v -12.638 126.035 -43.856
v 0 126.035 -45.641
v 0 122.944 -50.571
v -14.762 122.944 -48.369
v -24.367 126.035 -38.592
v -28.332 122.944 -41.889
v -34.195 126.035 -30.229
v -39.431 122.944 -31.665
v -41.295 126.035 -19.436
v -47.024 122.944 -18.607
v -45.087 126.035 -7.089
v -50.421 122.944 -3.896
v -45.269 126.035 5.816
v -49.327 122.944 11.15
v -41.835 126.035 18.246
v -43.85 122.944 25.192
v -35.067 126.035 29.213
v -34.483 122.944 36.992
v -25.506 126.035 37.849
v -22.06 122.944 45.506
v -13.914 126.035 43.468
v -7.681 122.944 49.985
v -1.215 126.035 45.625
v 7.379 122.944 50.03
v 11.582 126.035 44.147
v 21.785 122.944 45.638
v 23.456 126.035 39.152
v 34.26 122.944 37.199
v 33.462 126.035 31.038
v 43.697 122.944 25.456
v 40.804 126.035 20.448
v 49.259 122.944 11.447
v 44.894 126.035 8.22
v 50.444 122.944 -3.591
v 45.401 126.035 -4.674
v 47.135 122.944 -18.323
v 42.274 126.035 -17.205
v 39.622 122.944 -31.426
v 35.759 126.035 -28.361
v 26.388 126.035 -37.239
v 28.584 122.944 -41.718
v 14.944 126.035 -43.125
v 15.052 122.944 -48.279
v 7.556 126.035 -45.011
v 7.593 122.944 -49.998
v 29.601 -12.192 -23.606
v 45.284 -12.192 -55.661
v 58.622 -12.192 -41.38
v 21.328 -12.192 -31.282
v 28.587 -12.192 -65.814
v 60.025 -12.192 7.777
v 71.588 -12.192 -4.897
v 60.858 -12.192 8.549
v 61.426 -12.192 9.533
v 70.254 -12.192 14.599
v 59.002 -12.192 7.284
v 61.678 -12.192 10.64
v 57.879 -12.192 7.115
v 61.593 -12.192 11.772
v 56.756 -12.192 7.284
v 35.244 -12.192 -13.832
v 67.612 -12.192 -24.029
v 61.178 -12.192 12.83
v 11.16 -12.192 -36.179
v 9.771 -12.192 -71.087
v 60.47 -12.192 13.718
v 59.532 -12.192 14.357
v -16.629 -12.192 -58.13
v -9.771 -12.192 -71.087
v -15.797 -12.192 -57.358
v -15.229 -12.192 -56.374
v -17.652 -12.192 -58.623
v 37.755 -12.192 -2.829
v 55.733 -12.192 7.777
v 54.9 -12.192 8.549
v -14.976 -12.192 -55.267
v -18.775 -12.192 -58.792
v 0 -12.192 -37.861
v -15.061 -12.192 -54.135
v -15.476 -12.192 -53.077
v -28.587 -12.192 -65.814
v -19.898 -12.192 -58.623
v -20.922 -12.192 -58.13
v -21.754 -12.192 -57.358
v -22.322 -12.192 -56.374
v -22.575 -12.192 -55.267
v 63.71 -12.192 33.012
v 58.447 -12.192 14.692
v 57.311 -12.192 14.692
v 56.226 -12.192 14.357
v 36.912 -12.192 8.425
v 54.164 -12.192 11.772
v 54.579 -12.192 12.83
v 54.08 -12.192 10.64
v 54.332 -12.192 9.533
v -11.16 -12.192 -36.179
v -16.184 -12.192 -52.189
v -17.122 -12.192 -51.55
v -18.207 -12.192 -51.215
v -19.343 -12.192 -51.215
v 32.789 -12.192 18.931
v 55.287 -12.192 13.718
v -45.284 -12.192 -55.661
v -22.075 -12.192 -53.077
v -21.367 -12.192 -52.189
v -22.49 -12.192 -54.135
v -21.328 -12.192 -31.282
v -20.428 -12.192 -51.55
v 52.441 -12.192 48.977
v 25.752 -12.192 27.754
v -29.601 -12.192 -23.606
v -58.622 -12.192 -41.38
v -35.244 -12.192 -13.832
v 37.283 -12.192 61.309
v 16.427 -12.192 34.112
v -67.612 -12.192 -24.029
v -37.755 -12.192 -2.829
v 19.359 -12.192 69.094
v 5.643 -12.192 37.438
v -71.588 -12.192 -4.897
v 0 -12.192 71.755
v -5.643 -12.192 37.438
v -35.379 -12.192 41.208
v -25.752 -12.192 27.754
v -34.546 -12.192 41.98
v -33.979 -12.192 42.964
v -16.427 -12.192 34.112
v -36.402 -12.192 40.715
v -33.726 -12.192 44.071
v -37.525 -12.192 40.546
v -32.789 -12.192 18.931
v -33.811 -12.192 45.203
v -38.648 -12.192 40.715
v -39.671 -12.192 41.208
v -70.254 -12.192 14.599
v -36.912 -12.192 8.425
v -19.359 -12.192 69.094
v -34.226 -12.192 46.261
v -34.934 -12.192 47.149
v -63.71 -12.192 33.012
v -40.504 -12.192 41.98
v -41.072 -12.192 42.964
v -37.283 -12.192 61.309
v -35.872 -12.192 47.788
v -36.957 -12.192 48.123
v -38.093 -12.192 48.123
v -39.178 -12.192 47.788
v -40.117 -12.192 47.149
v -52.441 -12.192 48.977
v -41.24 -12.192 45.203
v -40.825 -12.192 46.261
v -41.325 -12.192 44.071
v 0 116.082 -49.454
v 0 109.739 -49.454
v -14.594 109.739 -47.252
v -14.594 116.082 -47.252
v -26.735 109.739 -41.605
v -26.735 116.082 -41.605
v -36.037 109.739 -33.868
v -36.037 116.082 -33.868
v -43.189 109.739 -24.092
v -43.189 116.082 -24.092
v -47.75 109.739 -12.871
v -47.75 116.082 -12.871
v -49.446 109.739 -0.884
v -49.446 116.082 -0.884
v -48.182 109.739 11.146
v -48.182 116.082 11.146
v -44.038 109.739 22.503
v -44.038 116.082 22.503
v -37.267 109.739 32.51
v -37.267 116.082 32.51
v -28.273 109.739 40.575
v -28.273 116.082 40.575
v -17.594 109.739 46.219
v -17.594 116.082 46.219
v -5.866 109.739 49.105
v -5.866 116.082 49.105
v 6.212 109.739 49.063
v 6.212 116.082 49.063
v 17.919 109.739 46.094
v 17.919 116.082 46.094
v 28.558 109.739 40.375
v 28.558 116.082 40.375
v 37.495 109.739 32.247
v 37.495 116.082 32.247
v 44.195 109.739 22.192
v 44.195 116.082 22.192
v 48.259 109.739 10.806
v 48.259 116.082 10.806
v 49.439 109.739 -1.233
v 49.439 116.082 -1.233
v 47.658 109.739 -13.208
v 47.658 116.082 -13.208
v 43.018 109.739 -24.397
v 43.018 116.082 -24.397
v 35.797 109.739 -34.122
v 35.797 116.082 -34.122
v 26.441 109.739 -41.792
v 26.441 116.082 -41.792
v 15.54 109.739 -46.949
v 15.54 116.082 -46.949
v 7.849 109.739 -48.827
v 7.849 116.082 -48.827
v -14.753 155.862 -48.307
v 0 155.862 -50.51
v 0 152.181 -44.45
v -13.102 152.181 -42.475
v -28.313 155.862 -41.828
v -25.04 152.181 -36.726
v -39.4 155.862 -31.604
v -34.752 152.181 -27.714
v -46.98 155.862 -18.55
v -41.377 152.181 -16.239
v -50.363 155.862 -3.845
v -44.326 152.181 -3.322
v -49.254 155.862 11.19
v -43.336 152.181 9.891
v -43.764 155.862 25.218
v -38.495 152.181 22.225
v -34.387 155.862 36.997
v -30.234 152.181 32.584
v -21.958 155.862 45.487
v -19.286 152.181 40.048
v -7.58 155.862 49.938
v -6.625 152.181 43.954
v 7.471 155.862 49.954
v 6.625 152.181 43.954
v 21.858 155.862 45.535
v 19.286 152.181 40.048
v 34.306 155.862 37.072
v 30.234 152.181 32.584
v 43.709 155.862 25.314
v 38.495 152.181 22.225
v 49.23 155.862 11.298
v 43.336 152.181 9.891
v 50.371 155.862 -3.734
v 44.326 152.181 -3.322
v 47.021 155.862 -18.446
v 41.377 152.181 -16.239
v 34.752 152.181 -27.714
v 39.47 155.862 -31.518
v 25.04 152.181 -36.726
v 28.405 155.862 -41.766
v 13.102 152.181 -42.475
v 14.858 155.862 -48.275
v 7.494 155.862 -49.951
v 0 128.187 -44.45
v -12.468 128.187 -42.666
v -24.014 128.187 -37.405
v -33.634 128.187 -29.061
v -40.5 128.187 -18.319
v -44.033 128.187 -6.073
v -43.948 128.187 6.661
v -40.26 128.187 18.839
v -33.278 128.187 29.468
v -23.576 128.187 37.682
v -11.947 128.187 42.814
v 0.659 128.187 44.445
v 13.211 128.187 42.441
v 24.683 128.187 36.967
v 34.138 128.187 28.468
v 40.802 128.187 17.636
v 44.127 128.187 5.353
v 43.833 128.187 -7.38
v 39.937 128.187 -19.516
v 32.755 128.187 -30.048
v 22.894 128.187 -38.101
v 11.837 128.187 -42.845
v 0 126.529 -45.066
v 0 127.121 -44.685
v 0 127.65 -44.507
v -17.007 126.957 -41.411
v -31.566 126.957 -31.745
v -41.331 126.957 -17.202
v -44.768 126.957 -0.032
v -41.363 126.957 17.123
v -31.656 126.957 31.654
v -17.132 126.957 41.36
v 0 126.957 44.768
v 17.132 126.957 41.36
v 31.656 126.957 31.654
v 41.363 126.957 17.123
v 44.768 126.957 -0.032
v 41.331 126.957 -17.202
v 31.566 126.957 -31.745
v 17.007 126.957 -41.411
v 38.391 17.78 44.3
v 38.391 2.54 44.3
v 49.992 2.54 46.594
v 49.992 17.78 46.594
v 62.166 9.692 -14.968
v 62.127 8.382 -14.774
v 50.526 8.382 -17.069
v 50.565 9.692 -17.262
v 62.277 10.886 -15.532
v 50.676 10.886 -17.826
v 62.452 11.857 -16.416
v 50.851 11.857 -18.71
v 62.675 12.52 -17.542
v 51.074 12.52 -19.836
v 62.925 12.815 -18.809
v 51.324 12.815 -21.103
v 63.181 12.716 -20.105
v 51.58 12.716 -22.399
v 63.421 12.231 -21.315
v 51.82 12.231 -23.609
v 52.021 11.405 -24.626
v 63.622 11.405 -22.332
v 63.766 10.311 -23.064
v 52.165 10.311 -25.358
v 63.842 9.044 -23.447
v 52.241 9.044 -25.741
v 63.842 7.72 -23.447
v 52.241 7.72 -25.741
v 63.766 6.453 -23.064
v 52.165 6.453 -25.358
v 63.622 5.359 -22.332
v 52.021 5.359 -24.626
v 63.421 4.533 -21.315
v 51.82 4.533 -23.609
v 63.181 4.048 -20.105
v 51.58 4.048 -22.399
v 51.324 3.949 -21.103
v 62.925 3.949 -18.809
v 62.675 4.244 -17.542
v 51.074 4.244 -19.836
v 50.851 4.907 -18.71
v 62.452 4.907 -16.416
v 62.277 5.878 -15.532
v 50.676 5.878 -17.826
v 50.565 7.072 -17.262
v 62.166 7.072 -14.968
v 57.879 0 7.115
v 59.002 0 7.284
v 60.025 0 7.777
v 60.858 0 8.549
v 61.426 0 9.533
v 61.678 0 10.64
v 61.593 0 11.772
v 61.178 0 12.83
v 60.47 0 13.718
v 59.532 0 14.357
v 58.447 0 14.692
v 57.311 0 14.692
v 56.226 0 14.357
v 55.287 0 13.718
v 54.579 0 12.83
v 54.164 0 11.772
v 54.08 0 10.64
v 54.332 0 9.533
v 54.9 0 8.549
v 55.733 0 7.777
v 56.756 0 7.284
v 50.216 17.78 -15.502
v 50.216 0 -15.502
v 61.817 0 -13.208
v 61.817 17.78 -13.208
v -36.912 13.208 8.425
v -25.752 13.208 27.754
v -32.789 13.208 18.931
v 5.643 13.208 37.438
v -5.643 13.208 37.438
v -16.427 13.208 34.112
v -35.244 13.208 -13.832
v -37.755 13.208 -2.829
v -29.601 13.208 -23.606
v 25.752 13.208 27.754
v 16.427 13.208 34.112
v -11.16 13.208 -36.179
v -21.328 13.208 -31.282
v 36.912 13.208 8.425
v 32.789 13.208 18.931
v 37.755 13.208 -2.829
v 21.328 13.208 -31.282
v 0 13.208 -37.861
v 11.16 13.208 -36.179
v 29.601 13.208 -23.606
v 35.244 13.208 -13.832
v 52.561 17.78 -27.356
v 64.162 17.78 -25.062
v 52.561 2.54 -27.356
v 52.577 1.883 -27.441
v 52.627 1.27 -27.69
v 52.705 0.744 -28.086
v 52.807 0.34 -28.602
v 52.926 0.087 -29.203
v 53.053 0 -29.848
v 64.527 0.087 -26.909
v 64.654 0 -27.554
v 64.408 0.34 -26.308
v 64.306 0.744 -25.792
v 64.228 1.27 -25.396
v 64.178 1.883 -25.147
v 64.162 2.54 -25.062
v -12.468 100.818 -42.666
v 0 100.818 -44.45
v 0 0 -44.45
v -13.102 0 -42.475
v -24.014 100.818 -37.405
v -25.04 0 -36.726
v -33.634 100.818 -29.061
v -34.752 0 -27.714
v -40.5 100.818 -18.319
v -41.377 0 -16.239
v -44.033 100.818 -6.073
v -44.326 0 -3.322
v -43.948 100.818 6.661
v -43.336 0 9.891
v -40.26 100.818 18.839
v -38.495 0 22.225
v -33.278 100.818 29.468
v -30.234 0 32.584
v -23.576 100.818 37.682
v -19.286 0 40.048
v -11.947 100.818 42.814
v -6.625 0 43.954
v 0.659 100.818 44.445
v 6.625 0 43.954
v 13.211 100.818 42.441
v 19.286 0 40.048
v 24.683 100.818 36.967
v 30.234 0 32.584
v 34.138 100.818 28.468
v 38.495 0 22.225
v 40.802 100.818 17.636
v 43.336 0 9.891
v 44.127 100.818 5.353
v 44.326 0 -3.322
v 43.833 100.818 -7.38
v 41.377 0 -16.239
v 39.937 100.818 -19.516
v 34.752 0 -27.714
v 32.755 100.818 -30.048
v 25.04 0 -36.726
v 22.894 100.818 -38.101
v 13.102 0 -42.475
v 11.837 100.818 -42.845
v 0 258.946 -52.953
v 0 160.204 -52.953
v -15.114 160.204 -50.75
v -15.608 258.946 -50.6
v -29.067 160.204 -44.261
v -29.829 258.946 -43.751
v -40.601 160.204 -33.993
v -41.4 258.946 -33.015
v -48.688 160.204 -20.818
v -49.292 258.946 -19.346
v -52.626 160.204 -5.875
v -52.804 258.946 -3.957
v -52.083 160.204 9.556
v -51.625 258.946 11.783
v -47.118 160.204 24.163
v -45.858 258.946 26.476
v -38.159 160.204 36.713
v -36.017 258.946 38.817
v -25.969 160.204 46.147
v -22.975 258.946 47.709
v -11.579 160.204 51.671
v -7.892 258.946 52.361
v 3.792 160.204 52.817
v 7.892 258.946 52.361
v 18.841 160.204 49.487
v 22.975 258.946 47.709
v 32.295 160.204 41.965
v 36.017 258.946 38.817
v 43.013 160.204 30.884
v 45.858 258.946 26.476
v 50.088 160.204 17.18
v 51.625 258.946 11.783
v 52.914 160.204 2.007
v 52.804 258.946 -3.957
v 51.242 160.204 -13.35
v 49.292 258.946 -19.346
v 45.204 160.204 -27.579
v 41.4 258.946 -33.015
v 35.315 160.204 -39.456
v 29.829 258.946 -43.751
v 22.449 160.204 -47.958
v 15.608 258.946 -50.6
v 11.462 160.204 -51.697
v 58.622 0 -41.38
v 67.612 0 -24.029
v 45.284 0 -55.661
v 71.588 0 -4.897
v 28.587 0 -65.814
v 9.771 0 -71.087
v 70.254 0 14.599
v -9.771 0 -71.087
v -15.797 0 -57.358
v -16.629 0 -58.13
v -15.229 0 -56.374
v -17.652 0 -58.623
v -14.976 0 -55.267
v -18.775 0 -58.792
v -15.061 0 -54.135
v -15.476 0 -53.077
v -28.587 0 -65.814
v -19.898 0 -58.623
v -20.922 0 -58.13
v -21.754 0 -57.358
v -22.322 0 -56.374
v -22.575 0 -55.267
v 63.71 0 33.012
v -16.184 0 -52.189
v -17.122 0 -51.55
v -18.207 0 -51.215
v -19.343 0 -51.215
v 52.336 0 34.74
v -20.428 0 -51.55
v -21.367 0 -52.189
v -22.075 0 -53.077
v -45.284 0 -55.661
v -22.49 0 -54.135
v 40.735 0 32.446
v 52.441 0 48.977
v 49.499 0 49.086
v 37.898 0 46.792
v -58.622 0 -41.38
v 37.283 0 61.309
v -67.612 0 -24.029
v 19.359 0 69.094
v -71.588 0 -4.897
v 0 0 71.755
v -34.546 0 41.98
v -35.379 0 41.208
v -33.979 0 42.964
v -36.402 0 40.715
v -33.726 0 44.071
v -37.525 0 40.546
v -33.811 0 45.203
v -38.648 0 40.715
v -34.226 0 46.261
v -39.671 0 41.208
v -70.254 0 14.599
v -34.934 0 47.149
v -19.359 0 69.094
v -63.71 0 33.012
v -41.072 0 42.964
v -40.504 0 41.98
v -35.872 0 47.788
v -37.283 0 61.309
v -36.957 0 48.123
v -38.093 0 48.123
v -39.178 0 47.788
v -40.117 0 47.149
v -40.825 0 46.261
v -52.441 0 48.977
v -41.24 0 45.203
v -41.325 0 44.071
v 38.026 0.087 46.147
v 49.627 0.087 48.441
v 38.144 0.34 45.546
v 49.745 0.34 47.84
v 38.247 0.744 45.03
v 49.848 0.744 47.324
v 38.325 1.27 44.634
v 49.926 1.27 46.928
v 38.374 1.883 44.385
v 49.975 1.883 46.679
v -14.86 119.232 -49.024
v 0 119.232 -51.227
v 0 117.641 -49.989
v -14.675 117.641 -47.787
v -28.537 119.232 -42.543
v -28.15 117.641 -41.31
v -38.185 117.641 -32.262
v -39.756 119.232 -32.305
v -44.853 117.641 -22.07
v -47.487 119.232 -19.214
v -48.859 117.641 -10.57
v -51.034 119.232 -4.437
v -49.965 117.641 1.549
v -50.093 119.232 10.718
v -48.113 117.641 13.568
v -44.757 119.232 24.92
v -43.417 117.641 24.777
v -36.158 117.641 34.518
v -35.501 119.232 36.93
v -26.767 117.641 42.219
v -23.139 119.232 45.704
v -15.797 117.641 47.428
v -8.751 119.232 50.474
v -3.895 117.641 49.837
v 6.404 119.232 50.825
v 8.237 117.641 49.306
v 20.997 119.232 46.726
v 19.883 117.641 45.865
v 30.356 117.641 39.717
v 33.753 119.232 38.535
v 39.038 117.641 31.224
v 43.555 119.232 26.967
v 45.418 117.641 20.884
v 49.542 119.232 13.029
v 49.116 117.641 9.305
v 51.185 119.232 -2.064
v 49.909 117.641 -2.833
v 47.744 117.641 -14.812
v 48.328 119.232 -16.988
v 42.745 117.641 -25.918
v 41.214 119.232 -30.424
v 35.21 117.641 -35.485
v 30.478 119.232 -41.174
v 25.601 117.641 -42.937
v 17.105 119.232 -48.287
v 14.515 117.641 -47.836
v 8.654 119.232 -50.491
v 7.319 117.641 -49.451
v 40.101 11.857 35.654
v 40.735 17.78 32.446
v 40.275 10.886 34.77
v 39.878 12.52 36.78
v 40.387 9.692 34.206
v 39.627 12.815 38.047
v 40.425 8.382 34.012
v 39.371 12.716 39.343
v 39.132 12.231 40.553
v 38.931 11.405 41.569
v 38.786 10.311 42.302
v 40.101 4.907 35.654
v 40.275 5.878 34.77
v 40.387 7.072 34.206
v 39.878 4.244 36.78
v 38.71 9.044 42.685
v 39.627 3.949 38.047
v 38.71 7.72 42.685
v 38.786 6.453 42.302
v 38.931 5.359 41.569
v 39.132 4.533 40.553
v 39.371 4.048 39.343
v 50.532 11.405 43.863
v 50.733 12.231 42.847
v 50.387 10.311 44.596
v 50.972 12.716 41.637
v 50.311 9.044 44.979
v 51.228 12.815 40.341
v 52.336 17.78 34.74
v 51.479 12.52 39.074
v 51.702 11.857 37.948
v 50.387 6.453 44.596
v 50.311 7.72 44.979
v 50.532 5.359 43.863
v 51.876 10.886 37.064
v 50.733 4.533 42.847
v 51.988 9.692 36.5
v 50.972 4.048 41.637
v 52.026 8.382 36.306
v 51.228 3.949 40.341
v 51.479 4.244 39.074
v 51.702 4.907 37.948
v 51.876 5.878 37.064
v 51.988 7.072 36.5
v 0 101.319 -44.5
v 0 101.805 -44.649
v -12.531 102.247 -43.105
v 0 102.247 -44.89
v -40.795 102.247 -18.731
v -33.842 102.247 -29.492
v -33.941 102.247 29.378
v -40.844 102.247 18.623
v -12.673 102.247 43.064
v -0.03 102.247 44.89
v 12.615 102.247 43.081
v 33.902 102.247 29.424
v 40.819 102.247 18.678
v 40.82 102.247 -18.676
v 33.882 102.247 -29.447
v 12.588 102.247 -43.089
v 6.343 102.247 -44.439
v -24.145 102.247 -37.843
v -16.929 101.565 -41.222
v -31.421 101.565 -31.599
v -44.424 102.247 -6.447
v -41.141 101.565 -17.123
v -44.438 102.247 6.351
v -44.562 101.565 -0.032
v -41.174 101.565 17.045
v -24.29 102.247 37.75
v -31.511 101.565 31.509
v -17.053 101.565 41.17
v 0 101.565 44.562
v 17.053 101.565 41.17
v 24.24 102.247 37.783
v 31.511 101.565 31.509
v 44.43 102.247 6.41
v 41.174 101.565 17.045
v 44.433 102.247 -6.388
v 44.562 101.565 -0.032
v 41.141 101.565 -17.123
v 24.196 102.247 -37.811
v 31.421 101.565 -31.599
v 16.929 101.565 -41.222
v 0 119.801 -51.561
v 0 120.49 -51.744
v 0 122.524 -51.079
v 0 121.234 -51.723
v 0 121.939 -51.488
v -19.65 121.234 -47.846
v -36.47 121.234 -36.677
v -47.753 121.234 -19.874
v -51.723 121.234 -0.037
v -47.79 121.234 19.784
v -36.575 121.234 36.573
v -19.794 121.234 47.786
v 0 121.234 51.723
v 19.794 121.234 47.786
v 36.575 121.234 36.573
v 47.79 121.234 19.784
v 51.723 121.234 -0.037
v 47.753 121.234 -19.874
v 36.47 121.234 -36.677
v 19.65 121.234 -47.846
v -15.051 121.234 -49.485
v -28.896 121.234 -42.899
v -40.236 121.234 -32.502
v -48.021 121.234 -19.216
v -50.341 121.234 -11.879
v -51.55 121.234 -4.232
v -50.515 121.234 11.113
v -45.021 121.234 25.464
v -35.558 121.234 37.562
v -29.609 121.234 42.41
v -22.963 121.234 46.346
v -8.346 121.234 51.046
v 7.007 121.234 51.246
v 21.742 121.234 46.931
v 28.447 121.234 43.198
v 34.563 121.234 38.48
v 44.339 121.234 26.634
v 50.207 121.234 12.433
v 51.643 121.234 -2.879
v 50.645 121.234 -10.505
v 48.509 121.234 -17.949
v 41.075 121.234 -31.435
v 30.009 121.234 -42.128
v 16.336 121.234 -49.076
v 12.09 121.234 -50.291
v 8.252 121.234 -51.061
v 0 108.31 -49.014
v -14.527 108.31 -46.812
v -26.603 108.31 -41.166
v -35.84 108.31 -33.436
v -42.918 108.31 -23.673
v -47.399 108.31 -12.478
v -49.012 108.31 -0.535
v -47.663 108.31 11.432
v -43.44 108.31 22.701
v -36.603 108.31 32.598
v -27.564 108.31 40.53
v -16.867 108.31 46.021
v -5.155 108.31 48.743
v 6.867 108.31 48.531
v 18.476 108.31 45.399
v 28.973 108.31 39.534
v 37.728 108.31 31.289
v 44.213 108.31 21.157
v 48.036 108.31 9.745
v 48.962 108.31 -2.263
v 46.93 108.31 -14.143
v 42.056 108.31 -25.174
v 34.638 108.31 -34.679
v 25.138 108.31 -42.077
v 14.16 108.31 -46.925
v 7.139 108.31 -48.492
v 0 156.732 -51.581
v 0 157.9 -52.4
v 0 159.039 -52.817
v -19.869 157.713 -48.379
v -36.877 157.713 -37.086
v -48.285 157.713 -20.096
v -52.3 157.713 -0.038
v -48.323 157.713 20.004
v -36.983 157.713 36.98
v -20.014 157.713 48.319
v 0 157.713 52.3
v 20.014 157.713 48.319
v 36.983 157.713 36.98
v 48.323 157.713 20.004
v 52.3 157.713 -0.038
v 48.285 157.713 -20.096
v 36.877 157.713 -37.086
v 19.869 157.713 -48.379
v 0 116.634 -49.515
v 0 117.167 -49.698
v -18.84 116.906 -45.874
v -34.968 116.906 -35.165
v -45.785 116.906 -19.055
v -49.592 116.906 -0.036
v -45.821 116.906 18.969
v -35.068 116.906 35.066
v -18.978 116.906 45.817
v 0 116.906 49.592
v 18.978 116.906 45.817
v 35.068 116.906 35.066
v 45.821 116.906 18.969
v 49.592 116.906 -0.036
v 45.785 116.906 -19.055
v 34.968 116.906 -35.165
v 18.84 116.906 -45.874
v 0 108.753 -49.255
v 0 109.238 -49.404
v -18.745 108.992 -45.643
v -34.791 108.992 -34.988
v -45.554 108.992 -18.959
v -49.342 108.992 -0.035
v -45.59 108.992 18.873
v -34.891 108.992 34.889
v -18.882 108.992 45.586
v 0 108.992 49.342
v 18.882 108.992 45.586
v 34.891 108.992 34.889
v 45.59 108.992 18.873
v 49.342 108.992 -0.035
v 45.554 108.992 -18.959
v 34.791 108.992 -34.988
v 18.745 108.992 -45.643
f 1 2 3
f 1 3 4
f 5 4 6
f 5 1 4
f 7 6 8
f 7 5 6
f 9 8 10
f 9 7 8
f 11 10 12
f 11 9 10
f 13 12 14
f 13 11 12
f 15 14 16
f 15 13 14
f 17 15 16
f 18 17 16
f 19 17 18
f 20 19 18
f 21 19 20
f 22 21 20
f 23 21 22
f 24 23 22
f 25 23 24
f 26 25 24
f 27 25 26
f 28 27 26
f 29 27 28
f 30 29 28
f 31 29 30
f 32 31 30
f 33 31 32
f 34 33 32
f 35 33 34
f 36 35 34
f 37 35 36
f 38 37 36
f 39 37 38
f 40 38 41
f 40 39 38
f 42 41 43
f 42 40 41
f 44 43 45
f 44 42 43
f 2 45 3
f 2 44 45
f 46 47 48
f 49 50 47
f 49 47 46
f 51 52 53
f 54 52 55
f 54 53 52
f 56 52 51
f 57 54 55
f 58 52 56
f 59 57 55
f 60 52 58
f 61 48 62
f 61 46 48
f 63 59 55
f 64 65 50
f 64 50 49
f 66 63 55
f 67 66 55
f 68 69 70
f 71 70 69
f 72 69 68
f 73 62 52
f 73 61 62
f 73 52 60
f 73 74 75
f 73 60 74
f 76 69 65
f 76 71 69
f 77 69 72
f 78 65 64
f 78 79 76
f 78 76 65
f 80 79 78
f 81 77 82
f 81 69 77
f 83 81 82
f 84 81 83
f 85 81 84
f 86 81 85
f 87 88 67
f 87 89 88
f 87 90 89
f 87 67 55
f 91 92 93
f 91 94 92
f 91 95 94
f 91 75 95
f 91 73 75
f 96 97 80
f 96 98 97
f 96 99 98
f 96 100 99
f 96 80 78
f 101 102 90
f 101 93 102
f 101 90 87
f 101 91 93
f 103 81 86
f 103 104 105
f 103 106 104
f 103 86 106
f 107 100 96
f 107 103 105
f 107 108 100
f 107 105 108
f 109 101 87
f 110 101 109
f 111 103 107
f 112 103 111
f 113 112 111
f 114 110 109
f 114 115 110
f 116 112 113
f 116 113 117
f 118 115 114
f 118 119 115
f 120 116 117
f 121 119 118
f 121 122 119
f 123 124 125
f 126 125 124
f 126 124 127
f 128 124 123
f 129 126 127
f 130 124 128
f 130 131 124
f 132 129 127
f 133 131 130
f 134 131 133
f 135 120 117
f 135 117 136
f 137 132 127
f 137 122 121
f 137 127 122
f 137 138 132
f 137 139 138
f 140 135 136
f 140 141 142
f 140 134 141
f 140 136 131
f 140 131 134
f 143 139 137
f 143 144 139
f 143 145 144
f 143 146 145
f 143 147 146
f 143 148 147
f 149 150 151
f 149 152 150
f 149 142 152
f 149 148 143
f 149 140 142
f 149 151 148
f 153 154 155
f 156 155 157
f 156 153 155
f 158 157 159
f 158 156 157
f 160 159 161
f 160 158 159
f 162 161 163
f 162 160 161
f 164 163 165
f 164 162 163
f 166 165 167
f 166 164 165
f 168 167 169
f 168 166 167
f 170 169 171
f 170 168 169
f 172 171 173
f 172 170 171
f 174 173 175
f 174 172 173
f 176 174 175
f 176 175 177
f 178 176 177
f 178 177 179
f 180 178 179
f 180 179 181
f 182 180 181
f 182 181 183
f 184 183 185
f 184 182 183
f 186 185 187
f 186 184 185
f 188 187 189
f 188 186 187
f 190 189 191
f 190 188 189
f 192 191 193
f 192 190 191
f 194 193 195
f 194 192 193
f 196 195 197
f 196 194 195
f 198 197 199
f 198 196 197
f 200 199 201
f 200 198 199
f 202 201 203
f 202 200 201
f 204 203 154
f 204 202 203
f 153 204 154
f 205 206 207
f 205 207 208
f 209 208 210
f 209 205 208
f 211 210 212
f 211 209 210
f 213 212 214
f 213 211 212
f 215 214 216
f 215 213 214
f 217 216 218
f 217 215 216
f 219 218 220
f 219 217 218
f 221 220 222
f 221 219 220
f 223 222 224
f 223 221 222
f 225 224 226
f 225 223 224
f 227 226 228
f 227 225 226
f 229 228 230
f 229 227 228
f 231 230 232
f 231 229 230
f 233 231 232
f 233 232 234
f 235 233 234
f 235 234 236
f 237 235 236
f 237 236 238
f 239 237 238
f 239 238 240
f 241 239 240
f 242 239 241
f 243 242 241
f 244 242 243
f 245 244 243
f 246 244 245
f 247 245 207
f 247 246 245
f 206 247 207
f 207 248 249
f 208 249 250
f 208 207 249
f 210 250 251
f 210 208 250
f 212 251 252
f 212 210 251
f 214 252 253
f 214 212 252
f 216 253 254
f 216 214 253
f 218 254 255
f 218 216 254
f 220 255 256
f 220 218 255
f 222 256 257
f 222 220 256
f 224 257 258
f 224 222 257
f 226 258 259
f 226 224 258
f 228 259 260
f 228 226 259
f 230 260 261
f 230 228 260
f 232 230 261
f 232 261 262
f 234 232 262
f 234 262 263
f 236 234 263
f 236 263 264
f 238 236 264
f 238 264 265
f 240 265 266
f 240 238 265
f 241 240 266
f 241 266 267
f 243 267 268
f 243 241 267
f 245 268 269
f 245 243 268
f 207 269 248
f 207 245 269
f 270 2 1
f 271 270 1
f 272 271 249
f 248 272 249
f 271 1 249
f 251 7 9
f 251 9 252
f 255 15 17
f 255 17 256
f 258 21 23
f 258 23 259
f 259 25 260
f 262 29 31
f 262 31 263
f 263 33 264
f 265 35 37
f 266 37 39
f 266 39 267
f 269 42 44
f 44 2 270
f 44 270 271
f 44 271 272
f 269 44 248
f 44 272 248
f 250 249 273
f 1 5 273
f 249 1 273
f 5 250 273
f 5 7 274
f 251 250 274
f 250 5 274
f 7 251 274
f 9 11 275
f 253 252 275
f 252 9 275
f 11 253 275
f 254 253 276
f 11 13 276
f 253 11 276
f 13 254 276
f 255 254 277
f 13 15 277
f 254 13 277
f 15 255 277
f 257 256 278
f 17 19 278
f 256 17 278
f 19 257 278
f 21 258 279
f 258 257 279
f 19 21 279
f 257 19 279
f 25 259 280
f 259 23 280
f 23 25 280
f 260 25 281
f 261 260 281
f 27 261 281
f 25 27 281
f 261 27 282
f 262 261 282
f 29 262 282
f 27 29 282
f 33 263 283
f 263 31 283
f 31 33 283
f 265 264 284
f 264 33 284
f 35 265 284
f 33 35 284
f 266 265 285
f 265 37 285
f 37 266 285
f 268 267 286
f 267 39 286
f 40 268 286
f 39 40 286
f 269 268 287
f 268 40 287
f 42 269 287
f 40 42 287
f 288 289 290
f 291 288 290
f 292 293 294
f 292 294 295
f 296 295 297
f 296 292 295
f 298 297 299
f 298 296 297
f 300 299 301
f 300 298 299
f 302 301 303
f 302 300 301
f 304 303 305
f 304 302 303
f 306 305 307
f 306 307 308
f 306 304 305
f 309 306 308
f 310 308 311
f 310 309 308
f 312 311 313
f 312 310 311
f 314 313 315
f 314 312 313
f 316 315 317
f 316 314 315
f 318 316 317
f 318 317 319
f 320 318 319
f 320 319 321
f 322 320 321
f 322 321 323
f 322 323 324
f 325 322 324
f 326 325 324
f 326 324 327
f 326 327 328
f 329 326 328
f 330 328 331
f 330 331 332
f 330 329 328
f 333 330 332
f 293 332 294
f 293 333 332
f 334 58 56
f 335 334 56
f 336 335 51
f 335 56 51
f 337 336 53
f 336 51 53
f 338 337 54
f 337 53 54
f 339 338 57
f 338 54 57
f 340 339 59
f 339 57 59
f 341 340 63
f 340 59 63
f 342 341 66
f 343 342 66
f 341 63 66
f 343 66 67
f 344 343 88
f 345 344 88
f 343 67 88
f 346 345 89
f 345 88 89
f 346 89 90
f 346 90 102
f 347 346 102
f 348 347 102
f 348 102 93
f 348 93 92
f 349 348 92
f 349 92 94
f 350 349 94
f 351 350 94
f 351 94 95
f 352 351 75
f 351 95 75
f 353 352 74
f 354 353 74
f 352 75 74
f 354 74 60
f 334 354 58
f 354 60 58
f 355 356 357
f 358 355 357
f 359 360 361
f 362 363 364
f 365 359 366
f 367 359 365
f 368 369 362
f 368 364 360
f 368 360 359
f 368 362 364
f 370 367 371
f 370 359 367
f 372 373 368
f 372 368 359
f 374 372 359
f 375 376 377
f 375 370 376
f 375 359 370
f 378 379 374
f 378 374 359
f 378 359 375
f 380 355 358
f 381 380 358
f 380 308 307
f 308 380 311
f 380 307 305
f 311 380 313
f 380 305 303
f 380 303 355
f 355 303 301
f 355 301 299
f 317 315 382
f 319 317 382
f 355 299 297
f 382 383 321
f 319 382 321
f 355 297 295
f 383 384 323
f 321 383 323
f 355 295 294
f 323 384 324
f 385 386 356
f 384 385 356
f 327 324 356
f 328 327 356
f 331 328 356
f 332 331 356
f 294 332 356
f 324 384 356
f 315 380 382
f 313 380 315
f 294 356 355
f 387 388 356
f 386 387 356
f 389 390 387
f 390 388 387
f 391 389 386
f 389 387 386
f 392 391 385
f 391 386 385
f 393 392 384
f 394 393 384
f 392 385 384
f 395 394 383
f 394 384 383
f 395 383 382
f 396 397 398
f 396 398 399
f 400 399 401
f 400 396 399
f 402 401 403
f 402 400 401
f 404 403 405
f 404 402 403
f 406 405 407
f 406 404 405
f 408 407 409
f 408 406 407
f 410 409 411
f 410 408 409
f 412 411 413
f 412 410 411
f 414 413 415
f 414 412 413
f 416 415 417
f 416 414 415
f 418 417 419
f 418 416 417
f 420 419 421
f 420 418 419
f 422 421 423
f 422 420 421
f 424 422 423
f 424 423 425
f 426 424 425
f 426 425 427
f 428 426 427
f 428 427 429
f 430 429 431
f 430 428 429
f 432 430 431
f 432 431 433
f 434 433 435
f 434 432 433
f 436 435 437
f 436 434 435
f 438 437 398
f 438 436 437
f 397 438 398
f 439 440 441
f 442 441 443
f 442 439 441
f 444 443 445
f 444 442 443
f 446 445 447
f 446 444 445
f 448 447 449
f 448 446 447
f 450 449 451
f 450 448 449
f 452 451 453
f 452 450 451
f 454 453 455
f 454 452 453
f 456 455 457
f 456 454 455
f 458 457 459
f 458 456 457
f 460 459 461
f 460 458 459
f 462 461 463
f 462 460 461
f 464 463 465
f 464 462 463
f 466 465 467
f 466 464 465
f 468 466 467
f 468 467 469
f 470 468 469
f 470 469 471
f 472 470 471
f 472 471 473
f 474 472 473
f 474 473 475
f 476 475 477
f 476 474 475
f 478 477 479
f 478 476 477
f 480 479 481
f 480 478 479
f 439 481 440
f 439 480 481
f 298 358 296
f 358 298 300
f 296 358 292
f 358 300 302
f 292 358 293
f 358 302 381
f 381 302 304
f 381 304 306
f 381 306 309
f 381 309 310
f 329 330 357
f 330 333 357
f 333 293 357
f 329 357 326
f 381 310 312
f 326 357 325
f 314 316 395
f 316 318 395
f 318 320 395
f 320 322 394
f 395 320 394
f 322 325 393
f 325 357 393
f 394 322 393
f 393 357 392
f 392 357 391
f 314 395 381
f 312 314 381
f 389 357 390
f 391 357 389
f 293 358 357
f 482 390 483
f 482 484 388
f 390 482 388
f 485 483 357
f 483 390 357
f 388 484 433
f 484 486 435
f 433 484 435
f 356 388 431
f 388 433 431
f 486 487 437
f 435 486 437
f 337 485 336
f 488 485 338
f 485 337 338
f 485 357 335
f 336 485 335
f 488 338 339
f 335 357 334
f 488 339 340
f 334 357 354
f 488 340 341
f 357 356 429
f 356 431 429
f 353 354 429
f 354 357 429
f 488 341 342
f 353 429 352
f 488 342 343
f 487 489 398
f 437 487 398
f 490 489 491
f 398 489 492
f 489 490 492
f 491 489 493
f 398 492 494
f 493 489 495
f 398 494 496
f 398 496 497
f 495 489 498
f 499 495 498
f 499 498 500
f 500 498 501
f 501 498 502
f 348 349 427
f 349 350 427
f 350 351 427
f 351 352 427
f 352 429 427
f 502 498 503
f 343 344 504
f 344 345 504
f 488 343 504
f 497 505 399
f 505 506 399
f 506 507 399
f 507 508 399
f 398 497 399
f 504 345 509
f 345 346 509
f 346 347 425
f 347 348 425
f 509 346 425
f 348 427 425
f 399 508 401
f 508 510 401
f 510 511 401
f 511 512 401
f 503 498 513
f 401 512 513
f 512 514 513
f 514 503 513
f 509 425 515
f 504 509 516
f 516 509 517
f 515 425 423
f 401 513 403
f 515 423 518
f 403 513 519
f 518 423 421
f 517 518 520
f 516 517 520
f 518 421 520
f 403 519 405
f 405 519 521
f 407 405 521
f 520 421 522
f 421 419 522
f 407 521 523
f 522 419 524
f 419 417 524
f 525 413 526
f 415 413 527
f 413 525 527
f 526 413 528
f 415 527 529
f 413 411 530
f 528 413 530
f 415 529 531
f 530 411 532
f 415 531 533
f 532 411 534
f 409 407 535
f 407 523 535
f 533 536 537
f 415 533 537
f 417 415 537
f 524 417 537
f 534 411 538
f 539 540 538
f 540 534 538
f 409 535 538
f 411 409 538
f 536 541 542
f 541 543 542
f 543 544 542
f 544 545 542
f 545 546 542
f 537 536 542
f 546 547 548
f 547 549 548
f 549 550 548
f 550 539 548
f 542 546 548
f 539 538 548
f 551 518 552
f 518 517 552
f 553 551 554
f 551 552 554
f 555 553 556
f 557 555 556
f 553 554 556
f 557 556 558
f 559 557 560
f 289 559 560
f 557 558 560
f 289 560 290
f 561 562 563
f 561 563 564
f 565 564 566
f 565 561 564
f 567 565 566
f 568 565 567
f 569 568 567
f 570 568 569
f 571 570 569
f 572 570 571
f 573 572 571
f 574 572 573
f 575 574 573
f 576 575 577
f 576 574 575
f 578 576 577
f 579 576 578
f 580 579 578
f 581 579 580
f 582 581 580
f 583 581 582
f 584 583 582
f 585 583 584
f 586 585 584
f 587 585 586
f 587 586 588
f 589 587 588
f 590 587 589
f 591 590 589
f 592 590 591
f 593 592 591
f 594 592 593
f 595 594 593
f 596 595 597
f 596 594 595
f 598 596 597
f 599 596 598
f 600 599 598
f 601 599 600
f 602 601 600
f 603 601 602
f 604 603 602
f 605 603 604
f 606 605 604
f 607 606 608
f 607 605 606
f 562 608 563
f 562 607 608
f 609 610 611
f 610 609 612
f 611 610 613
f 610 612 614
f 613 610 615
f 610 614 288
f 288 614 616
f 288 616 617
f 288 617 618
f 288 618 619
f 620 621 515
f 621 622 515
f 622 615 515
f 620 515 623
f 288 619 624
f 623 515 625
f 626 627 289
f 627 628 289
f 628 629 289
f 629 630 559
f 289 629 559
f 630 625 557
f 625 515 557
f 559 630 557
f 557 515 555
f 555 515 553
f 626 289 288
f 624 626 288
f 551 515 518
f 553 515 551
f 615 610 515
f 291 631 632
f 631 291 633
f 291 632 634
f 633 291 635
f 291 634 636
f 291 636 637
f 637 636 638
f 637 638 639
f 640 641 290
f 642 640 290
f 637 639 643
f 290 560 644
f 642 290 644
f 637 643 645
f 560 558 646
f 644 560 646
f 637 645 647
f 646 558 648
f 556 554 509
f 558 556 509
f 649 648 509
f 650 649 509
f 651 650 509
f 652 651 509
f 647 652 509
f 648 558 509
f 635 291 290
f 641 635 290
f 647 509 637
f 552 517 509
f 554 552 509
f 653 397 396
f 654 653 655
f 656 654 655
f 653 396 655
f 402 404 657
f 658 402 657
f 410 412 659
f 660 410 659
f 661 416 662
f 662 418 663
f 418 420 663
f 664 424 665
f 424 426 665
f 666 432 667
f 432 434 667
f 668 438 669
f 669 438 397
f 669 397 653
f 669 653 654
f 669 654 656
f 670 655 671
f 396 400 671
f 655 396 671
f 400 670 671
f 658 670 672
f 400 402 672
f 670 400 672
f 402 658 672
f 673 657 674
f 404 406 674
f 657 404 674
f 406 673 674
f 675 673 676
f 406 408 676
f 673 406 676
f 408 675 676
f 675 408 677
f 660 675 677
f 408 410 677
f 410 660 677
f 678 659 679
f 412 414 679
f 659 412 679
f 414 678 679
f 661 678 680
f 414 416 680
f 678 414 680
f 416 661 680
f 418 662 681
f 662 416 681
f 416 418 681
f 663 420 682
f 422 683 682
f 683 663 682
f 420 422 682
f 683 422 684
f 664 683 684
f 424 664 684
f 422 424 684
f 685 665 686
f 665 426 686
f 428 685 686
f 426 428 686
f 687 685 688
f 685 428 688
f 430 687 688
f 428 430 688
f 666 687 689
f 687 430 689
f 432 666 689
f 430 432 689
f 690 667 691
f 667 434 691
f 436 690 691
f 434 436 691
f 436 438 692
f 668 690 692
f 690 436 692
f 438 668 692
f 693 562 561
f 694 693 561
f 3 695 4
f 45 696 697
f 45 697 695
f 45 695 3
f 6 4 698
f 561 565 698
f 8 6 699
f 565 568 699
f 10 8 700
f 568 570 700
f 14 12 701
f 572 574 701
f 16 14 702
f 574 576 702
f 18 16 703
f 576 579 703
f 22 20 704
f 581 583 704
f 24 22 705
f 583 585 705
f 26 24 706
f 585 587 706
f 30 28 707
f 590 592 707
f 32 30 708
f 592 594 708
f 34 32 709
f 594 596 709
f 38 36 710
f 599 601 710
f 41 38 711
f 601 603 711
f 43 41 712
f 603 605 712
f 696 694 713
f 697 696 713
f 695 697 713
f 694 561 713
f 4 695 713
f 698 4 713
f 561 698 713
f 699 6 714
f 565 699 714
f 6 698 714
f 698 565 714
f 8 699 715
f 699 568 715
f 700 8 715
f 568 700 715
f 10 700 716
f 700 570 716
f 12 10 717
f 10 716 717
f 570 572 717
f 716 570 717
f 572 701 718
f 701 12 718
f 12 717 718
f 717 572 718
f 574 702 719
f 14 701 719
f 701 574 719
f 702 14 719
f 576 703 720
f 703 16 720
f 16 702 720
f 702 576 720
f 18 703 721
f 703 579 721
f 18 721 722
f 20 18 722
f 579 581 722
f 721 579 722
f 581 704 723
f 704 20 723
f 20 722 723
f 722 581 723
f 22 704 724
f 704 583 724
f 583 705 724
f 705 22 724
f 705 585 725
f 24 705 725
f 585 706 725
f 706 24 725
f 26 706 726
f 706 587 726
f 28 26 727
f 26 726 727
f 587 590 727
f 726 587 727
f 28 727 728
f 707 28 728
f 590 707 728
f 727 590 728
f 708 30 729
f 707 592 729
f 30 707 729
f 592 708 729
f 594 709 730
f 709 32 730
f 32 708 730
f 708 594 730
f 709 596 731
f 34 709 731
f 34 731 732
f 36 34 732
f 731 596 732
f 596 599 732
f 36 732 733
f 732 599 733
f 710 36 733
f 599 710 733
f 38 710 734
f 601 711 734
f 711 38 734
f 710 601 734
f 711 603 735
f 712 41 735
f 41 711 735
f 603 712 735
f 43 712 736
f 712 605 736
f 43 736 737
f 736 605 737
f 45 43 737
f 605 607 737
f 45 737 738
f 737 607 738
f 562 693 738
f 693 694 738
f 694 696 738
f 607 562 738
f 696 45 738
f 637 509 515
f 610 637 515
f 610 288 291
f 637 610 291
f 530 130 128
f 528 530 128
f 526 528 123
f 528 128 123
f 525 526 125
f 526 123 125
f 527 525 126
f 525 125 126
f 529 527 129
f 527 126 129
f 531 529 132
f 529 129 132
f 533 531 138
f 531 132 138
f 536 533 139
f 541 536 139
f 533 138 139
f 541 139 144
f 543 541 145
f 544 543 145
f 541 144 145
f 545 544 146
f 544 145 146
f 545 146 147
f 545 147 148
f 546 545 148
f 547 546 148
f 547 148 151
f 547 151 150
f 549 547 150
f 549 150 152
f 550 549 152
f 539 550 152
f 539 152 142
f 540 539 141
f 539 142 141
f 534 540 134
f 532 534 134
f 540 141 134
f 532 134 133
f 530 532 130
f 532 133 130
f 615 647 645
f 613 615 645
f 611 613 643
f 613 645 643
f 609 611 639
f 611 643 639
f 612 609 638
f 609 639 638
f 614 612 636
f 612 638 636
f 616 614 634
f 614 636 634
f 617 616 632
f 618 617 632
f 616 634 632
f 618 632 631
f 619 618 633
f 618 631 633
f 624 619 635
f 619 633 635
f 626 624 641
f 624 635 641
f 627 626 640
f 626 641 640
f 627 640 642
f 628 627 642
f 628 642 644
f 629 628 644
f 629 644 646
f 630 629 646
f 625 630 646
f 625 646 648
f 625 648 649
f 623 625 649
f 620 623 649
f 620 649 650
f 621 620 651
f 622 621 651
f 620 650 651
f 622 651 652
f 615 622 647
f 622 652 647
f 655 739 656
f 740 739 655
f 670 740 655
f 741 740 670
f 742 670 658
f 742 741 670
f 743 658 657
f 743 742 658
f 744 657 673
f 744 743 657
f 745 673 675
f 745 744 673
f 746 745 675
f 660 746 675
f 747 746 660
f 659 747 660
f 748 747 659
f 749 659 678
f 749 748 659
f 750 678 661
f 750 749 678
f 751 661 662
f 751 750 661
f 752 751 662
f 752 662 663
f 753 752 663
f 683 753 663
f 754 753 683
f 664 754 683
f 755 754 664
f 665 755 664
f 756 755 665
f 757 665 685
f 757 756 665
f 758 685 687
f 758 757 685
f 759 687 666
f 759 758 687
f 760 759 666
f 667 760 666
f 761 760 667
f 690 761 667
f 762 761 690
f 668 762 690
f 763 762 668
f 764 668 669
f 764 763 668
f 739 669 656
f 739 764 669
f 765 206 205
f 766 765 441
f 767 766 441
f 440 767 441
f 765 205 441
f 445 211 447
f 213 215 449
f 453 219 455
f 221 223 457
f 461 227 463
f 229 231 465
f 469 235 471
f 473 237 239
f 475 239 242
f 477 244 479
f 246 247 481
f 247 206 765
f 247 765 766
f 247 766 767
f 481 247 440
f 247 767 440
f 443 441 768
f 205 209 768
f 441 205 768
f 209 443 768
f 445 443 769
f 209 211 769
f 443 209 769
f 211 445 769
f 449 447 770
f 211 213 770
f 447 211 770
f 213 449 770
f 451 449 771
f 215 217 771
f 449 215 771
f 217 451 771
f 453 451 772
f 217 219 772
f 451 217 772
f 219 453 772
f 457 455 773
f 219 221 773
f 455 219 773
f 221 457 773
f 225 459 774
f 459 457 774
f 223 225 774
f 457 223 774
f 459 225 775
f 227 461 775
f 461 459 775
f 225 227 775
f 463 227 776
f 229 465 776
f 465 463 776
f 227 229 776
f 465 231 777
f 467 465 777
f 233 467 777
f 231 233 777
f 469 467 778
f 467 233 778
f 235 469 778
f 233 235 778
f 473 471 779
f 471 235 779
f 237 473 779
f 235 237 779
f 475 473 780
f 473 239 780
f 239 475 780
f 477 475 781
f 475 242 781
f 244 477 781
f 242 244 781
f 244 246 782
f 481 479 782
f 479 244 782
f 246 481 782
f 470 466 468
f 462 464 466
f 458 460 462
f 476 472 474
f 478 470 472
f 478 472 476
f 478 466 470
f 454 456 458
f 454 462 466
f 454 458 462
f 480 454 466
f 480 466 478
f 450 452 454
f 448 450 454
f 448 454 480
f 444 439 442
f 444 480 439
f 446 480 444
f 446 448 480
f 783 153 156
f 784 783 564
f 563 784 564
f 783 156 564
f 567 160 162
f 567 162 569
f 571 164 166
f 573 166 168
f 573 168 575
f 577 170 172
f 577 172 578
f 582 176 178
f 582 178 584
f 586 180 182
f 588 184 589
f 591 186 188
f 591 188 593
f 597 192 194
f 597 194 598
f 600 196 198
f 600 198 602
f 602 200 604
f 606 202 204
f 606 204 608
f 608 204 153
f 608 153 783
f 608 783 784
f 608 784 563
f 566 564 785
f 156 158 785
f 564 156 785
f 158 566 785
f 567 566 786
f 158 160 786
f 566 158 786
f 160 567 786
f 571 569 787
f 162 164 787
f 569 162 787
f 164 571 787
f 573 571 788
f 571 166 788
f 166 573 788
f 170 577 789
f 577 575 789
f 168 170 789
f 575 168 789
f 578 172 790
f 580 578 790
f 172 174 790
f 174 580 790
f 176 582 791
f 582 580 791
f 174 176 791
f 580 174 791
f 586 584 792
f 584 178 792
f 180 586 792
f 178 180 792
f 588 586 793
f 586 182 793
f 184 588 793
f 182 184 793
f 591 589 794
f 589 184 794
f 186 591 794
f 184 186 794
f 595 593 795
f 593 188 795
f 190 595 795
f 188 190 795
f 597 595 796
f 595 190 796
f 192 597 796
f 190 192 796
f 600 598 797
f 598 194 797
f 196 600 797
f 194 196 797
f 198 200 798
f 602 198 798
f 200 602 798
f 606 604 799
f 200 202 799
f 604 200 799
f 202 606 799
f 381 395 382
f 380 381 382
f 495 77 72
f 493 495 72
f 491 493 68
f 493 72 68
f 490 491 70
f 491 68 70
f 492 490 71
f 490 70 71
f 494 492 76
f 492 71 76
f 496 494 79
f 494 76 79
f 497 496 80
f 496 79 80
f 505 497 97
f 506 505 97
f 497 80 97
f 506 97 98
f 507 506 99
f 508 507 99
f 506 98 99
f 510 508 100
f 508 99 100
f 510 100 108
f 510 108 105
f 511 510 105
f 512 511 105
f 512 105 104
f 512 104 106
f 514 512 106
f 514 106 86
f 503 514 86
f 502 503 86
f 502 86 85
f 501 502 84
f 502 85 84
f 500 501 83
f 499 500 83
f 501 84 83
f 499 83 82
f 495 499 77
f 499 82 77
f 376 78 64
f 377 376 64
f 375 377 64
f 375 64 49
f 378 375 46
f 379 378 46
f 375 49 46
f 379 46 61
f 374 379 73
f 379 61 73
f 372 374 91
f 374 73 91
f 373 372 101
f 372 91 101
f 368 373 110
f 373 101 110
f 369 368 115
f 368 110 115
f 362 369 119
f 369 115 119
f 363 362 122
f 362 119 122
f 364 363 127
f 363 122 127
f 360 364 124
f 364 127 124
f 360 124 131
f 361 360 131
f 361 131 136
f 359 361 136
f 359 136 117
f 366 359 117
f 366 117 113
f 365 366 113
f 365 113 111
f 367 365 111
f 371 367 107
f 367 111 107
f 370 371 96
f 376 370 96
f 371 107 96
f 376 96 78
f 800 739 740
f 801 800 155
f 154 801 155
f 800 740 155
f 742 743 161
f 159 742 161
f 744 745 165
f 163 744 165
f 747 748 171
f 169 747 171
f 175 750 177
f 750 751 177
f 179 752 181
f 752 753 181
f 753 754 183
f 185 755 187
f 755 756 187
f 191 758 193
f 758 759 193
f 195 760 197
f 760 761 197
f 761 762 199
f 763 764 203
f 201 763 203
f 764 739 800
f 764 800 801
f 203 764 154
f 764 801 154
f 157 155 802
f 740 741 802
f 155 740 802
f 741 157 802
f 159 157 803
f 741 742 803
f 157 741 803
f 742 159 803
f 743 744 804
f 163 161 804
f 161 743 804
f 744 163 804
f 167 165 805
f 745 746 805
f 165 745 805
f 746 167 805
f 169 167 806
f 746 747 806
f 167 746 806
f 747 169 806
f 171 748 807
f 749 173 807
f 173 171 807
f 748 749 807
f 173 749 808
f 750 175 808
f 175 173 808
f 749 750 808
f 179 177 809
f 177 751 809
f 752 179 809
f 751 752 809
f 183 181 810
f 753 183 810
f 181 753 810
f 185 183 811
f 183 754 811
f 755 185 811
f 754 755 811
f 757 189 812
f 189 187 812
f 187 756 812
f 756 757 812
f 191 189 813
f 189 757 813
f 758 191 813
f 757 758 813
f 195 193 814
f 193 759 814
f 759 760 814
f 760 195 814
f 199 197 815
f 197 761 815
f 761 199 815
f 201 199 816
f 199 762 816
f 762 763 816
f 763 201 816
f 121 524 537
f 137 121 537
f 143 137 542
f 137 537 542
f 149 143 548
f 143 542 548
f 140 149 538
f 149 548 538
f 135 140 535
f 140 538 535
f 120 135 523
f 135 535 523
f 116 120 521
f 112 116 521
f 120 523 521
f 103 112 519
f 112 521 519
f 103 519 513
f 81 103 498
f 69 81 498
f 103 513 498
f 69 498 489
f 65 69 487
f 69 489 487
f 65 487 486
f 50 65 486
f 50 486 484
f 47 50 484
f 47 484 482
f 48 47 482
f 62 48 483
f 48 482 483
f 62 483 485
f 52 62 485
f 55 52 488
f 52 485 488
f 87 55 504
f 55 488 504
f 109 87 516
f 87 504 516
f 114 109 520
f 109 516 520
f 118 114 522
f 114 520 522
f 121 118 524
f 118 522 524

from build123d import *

# Parameters (mm, degrees)
SKETCH3_R           = 71.755
BOSS_EXTRUDE1_DEPTH = 12.192
SKETCH5_R           = 3.81
CUT_EXTRUDE1_DEPTH  = 12.192
BOSS_EXTRUDE2_DEPTH = 17.78
SKETCH7_R           = 4.445
CUT_EXTRUDE2_DEPTH  = 11.825629063
FILLET1_R           = 2.54
FILLET2_R           = 2.54
FILLET3_R           = 2.54
FILLET4_R           = 5.08
SKETCH8_R           = 37.861238203
CUT_EXTRUDE3_DEPTH  = 25.4


with BuildPart() as part:
    # Sketch2 → Revolve1 (revolve)
    with BuildSketch(Plane.XY, mode=Mode.PRIVATE) as revolve1_sk:
        Polygon((44.45, 101.6), (49.454248958, 108.957028549), (49.454248958, 116.953034196), (52.952501428, 121.450787373), (44.45, 126.781457804), (44.45, 152.181457804), (52.952501428, 157.345544784), (52.952501428, 258.945544784), (0, 258.945544784), (0, 0), (44.45, 0), align=None)
    revolve(revolve1_sk.sketch.rotate(Axis((0, 0, 0), (0, 1, 0)), 90), axis=Axis((0, 0, 0), (0, 1, 0)))

    # Sketch3 → Boss-Extrude1 (add)
    with BuildSketch(Plane(origin=(0, 0, 0), x_dir=(-1, 0, 0), z_dir=(0, -1, 0))):
        with Locations(Location((0, 0, 0), (0, 0, 270))):
            Circle(SKETCH3_R)
    extrude(amount=BOSS_EXTRUDE1_DEPTH)

    # Sketch5 → Cut-Extrude1 (cut)
    with BuildSketch(Plane(origin=(0, -12.192, 0), x_dir=(-1, 0, 0), z_dir=(0, -1, 0))):
        with Locations(Location((37.525239886, -44.355653959, 0), (0, 0, 90))):
            Circle(SKETCH5_R)
        with Locations(Location((-57.878931107, -10.924581268, 0), (0, 0, 90))):
            Circle(SKETCH5_R)
        with Locations(Location((18.775312616, 54.982318092, 0), (0, 0, 90))):
            Circle(SKETCH5_R)
    extrude(amount=-CUT_EXTRUDE1_DEPTH, mode=Mode.SUBTRACT)

    # Sketch6 → Boss-Extrude2 (add)
    with BuildSketch(Plane(origin=(0, 0, 0), x_dir=(1, 0, 0), z_dir=(0, 1, 0))):
        Polygon((50.216487636, 15.501795378), (61.817471266, 13.207741855), (64.16167292, 25.062323602), (52.560689291, 27.356377124), align=None)
        Polygon((38.390858573, -44.300178647), (49.991842203, -46.59423217), (52.336043857, -34.739650423), (40.735060228, -32.445596901), align=None)
    extrude(amount=BOSS_EXTRUDE2_DEPTH)

    # Sketch7 → Cut-Extrude2 (cut)
    with BuildSketch(Plane(origin=(56.977651962, 0, 11.267129355), x_dir=(0.193989978070432, 0, -0.9810035109051514), z_dir=(0.9810035109051514, 0, 0.193989978070432))):
        with Locations((-29.969120003, 8.382)):
            Circle(SKETCH7_R)
    cut_extrude2 = extrude(amount=-CUT_EXTRUDE2_DEPTH, mode=Mode.SUBTRACT)

    # Fillet1
    fillet1_edges = [part.edges().sort_by_distance(p)[0] for p in [
        (44.191350388, 0, 45.447205408),
    ]]
    fillet(fillet1_edges, radius=FILLET1_R)

    # Mirror1: Cut-Extrude2 across plane
    add(cut_extrude2.mirror(Plane(origin=(0.099105599, 0, -0.50117507), x_dir=(0.9810035109051514, 0, 0.19398997807043172), z_dir=(-0.19398997807043172, 0, 0.9810035109051514))), mode=Mode.SUBTRACT)

    # Fillet2
    fillet2_edges = [part.edges().sort_by_distance(p)[0] for p in [
        (58.361181106, 0, -26.209350363),
    ]]
    fillet(fillet2_edges, radius=FILLET2_R)

    # Fillet3
    fillet3_edges = [part.edges().sort_by_distance(p)[0] for p in [
        (0, 116.953034196, 49.454248958),
        (0, 108.957028549, 49.454248958),
        (0, 101.6, 44.45),
        (0, 126.781457804, 44.45),
        (0, 121.450787373, 52.952501428),
    ]]
    fillet(fillet3_edges, radius=FILLET3_R)

    # Fillet4
    fillet4_edges = [part.edges().sort_by_distance(p)[0] for p in [
        (0, 157.345544784, 52.952501428),
    ]]
    fillet(fillet4_edges, radius=FILLET4_R)

    # Sketch8 → Cut-Extrude3 (cut)
    with BuildSketch(Plane(origin=(0, -12.192, 0), x_dir=(-1, 0, 0), z_dir=(0, -1, 0))):
        with Locations(Location((0, 0, 0), (0, 0, 90))):
            Circle(SKETCH8_R)
    extrude(amount=-CUT_EXTRUDE3_DEPTH, mode=Mode.SUBTRACT)


solid = part.part
